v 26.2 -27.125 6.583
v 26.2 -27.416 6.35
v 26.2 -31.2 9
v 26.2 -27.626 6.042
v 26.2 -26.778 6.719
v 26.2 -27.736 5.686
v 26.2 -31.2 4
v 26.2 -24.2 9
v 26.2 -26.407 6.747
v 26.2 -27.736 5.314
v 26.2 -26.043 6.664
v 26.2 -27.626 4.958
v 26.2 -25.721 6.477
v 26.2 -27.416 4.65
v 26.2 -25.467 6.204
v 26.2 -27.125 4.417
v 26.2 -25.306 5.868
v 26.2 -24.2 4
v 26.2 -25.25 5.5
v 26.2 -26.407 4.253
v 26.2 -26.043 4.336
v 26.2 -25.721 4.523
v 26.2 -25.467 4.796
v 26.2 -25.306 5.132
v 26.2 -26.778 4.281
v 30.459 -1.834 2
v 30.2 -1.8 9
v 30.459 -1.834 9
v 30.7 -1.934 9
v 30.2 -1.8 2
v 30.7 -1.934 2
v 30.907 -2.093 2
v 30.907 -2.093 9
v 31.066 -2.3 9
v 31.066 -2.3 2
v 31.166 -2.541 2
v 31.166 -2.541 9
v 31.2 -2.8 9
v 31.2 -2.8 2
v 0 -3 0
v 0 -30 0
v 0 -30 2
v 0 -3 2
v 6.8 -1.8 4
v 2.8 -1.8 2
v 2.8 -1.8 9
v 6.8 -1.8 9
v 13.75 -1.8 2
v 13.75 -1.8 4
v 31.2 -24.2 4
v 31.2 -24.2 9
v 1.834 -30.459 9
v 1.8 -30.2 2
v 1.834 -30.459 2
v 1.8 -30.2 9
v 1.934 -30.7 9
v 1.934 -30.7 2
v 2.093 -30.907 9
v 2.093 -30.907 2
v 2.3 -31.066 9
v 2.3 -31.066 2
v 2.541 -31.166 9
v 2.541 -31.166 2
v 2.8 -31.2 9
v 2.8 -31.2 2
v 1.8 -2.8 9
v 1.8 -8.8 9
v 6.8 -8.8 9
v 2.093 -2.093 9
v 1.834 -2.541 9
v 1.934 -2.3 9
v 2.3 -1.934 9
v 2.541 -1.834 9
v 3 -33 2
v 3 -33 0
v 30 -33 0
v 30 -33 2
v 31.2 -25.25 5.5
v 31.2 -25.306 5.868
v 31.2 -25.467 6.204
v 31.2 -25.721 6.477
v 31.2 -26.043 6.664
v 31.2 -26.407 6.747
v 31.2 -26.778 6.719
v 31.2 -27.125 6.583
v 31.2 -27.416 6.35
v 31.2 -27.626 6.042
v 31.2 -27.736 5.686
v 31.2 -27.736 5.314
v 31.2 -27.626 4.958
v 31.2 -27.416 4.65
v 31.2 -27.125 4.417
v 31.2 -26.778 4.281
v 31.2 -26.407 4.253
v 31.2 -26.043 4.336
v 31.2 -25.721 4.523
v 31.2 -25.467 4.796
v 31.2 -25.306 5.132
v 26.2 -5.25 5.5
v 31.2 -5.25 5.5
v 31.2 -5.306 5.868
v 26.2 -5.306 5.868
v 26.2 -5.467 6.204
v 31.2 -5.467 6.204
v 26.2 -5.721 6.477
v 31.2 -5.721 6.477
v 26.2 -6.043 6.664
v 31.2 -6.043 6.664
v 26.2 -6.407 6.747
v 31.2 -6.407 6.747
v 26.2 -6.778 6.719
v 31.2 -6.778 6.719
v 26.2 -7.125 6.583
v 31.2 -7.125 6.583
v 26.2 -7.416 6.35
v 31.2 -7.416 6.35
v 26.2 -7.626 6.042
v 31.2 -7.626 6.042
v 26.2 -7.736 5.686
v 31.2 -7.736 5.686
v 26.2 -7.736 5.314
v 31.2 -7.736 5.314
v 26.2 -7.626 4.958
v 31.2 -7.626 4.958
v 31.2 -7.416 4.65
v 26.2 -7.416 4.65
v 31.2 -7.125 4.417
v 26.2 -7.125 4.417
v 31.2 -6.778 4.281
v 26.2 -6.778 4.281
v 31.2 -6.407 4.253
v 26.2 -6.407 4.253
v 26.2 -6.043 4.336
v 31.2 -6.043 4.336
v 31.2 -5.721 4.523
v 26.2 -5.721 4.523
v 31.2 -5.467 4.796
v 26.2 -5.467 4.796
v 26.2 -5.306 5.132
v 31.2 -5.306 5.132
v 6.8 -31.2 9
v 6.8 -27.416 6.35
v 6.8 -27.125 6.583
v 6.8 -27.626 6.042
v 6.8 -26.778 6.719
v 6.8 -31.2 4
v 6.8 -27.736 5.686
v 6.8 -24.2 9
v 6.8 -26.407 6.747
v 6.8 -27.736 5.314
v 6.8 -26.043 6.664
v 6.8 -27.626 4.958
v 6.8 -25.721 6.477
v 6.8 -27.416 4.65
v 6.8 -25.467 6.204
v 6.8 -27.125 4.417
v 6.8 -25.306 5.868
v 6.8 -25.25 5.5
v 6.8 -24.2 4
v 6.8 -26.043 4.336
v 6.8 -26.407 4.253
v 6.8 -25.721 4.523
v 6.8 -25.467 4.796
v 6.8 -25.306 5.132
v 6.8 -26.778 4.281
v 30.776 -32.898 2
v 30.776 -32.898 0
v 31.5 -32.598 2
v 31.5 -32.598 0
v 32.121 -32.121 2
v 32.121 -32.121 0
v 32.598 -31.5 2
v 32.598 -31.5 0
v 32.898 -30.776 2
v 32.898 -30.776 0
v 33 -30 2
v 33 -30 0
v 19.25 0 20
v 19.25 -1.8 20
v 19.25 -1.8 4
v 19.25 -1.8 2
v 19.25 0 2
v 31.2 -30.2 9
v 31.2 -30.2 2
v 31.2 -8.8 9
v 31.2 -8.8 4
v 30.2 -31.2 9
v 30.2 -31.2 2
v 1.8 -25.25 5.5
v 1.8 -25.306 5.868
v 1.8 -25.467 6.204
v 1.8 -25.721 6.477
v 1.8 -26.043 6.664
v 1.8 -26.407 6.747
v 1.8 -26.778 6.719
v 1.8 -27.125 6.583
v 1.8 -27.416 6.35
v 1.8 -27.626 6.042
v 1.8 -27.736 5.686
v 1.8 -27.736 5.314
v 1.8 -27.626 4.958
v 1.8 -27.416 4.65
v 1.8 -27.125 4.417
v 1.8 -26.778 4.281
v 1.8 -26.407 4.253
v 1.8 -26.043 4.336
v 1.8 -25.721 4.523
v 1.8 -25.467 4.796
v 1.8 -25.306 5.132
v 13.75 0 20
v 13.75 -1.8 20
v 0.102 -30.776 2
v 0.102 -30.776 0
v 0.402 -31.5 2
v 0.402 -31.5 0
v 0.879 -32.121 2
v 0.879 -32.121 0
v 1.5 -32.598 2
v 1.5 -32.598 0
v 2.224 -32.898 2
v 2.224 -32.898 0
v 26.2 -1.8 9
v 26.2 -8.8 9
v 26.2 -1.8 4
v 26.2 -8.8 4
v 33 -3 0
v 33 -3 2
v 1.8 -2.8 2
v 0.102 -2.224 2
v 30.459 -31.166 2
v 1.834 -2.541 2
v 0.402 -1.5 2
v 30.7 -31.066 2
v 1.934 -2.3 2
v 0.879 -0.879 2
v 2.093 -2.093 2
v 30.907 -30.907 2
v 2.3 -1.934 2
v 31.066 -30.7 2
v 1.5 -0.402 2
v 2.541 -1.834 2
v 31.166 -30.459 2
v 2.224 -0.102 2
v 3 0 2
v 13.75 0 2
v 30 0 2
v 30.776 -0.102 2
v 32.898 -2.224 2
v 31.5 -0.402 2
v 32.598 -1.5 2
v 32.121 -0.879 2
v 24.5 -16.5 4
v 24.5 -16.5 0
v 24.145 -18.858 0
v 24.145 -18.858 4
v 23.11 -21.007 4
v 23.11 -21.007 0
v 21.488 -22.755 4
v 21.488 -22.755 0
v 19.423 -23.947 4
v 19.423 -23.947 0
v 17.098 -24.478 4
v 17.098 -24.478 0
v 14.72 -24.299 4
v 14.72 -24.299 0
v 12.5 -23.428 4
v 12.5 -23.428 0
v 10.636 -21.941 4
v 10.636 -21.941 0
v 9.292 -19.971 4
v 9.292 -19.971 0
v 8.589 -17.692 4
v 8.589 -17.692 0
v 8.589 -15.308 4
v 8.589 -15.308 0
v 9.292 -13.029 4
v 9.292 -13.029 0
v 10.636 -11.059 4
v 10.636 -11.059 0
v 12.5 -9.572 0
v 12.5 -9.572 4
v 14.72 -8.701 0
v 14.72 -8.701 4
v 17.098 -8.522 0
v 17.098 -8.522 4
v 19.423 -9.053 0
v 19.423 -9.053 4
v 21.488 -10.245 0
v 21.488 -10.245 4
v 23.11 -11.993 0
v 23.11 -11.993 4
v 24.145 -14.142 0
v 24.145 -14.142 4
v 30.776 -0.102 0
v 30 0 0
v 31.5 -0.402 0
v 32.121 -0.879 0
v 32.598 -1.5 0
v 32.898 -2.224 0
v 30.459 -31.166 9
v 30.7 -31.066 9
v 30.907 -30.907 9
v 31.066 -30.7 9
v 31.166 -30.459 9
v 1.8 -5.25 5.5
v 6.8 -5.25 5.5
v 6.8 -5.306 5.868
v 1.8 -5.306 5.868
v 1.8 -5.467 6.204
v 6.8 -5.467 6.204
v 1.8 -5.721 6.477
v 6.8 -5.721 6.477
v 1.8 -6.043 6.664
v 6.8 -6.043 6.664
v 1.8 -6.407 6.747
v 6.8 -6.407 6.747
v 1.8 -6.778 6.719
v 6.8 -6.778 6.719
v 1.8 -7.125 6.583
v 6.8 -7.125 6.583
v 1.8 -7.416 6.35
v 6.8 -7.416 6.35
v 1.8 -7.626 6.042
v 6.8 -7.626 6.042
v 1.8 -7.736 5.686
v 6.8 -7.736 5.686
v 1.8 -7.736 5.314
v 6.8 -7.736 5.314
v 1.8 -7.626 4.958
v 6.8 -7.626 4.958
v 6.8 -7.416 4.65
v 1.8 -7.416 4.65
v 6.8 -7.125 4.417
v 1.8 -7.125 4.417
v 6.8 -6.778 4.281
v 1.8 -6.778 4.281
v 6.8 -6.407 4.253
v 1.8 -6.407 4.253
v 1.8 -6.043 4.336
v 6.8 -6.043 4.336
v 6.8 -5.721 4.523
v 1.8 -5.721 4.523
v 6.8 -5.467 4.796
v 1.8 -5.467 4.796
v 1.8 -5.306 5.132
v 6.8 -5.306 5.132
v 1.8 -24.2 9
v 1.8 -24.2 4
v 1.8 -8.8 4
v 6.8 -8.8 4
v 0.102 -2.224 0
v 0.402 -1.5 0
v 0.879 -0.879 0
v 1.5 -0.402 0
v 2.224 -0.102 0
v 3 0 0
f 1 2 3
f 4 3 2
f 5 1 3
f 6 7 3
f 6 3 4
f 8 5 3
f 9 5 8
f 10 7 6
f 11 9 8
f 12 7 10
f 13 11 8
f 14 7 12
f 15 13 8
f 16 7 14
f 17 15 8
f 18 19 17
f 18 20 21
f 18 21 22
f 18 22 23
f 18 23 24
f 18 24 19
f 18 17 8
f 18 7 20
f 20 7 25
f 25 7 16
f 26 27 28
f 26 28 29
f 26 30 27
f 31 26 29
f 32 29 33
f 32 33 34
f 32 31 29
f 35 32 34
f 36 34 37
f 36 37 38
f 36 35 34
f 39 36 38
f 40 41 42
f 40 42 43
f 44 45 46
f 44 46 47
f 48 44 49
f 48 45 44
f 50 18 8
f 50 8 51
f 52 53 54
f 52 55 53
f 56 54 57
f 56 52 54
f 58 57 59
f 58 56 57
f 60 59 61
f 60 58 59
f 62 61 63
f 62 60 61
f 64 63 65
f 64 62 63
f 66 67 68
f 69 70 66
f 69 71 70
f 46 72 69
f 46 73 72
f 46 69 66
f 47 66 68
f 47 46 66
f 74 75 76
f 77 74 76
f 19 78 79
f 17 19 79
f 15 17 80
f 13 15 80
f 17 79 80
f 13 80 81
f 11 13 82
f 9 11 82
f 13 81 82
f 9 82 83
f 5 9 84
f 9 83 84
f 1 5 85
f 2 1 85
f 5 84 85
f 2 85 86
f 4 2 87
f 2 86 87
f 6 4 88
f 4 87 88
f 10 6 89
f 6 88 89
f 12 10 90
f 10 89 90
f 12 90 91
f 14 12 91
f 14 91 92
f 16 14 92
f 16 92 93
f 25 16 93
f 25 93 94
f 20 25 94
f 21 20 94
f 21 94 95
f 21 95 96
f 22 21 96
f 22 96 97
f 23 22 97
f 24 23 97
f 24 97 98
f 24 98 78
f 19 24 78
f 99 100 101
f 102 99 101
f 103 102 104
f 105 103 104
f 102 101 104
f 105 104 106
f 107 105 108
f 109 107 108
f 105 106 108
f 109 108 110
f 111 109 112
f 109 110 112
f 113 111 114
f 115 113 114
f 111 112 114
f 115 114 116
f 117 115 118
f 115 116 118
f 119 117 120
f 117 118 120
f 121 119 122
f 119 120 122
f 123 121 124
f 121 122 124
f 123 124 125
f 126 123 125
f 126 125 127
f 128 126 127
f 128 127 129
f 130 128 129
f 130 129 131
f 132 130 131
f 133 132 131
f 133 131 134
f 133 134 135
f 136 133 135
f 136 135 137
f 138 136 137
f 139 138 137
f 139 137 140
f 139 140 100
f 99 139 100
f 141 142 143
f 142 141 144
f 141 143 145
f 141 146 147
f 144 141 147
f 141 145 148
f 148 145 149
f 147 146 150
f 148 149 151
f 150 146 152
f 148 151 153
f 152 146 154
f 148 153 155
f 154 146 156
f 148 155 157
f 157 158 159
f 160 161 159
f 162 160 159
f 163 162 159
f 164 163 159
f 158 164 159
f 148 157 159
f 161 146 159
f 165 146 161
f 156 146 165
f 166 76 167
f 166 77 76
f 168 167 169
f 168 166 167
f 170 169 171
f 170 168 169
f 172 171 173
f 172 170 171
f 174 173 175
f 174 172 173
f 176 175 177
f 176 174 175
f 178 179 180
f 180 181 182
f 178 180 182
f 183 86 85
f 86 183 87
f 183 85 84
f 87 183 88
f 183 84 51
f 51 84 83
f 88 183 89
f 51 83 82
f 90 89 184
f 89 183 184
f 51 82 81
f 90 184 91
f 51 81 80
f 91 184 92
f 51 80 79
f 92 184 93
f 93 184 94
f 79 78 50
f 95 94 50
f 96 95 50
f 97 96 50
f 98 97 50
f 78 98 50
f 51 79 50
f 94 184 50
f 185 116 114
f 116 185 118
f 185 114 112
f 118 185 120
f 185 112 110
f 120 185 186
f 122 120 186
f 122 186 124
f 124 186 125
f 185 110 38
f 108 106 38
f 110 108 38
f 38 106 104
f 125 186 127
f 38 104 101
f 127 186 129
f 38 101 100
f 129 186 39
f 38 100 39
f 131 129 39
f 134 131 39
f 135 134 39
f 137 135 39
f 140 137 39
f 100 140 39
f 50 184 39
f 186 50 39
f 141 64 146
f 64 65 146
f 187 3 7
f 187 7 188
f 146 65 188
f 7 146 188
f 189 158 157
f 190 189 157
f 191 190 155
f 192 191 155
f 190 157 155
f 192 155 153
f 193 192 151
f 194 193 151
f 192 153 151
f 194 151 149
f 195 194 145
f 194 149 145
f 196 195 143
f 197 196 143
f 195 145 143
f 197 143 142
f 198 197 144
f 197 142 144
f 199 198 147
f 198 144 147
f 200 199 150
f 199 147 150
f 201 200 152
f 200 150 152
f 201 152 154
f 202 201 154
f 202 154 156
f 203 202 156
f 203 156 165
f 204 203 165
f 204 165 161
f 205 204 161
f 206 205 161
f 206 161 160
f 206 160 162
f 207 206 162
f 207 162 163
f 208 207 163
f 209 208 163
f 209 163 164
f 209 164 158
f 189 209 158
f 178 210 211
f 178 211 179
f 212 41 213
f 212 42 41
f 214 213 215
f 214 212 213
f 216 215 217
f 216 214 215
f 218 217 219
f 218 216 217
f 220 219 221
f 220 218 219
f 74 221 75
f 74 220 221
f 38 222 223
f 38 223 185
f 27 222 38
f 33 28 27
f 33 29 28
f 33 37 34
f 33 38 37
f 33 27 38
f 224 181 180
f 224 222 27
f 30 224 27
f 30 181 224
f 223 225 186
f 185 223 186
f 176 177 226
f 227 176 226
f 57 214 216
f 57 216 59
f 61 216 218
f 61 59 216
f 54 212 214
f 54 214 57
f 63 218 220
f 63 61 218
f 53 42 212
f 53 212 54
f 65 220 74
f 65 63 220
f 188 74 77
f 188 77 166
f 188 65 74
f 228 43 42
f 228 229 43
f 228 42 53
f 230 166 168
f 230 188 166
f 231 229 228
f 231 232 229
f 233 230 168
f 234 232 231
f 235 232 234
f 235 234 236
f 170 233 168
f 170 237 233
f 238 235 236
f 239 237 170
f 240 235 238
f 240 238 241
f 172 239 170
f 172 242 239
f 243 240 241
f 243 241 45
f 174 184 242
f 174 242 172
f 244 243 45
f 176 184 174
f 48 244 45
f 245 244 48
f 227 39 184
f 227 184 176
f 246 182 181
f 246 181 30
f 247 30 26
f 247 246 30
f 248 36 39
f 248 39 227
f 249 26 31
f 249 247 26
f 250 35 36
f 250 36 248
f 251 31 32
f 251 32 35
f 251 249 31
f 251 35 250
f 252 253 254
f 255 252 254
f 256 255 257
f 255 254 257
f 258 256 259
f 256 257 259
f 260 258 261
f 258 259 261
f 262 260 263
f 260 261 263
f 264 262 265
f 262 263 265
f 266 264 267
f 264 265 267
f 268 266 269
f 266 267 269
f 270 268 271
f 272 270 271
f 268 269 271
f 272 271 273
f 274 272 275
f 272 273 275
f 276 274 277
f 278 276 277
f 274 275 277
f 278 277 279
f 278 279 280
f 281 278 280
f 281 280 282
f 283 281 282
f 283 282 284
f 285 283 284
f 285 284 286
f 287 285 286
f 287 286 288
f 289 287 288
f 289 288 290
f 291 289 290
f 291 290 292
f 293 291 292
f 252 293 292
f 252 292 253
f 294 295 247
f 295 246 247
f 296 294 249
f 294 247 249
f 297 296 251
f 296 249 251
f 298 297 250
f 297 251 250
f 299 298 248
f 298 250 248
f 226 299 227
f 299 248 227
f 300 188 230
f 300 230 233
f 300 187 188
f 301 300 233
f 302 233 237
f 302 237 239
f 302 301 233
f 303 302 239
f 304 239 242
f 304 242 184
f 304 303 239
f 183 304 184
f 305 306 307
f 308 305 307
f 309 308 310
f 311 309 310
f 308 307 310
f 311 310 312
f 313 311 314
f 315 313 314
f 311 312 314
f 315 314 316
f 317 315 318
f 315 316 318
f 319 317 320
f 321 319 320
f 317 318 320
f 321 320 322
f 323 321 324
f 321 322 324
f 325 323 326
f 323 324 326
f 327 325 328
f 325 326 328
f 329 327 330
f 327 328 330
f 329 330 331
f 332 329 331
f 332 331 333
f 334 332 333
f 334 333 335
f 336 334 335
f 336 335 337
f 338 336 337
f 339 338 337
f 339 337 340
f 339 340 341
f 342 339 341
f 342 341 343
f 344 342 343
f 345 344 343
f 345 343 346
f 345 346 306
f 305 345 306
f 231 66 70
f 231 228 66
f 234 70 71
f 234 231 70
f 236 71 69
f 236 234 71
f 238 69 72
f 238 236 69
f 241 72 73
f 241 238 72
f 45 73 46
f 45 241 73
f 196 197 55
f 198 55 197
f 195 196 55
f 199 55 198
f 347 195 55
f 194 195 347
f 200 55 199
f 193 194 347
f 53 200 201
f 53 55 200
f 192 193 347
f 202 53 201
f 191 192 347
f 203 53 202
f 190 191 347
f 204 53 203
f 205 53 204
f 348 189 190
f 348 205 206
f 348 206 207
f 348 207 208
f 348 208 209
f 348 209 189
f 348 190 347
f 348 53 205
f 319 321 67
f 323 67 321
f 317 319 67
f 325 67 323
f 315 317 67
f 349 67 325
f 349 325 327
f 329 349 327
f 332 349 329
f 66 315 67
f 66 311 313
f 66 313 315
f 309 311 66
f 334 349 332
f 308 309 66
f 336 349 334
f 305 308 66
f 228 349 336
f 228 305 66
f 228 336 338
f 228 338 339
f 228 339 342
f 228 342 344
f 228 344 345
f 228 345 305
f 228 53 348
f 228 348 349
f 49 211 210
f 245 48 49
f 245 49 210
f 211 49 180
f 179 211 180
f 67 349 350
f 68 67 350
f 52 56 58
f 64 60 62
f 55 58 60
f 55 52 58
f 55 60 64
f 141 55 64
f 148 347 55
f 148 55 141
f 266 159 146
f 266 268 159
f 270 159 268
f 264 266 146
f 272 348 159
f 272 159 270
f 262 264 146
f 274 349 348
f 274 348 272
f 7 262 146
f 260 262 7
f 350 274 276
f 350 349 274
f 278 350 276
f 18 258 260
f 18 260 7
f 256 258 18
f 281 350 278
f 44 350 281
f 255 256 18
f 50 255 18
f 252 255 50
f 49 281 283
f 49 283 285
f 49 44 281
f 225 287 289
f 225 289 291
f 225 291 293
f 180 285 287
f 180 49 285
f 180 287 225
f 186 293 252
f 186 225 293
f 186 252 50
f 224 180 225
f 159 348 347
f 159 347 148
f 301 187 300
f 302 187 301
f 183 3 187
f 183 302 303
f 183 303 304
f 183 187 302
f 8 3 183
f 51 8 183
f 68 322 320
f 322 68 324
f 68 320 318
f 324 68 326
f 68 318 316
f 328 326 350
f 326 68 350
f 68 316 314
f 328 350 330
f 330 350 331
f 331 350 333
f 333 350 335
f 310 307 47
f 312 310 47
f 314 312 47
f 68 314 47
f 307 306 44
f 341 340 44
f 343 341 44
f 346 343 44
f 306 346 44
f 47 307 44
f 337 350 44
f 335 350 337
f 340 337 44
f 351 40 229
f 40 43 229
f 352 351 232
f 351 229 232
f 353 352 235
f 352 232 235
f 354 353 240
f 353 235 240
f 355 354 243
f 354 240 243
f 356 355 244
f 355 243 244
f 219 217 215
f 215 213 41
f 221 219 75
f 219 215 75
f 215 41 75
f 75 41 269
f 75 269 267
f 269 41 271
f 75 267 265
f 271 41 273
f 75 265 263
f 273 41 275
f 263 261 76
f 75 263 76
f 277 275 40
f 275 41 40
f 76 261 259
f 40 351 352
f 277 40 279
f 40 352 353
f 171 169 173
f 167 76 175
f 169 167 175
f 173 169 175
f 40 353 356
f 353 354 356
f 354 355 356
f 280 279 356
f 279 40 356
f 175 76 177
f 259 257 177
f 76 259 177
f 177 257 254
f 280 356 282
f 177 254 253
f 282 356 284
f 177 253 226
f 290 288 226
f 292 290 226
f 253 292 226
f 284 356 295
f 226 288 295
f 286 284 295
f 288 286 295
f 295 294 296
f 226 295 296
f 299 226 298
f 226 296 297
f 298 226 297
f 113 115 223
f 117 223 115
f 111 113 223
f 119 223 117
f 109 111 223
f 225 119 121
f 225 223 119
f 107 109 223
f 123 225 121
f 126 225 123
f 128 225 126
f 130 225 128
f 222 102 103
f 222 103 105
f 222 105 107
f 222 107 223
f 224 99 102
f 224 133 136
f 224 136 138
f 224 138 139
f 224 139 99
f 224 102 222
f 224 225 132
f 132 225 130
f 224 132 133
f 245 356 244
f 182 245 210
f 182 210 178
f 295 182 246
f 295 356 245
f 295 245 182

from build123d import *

# Parameters (mm, degrees)
F0_W      = 33
F0_H      = 33
F1_DEPTH  = 2
F2_W      = 29.4
F2_H      = 29.4
F3_DEPTH  = 2
F4_W      = 5
F4_H      = 7
F5_DEPTH  = 5
F6_R      = 8
F7_DEPTH  = 25
F8_R      = 1.25
F9_DEPTH  = 35
F10_R     = 1
F11_R     = 3
F12_W     = 5.5
F12_H     = 1.8
F13_DEPTH = 18


with BuildPart() as f1:
    # F0 (on Top) → F1 (new body)
    with BuildSketch(Plane.XY):
        with Locations((16.5, -16.5)):
            Rectangle(F0_W, F0_H)
    extrude(amount=F1_DEPTH)

    # F2 (on face) → F3 (join)
    with BuildSketch(Plane.XY.offset(2)):
        with Locations((16.5, -16.5)):
            Rectangle(F2_W, F2_H)
    extrude(amount=F3_DEPTH)

    # F4 (on face) → F5 (join)
    with BuildSketch(Plane.XY.offset(4)):
        with Locations((4.3, -5.3)):
            Rectangle(F4_W, F4_H)
        with Locations((4.3, -27.7)):
            Rectangle(F4_W, F4_H)
        with Locations((28.7, -5.3)):
            Rectangle(F4_W, F4_H)
        with Locations((28.7, -27.7)):
            Rectangle(F4_W, F4_H)
    extrude(amount=F5_DEPTH)

    # F6 (on face) → F7 (cut)
    with BuildSketch(Plane(origin=(0, 0, 0), x_dir=(1, 0, 0), z_dir=(0, 0, -1))):
        with Locations((16.5, 16.5)):
            Circle(F6_R)
    extrude(amount=-F7_DEPTH, mode=Mode.SUBTRACT)

    # F8 (on face) → F9 (cut)
    with BuildSketch(Plane.YZ.offset(31.2)):
        with Locations((-26.5, 5.5)):
            Circle(F8_R)
        with Locations((-6.5, 5.5)):
            Circle(F8_R)
    extrude(amount=-F9_DEPTH, mode=Mode.SUBTRACT)

    # F10
    f10_edges = [f1.edges().sort_by_distance(p)[0] for p in [
        (31.2, -1.8, 5.5),
        (1.8, -1.8, 5.5),
        (1.8, -31.2, 5.5),
        (31.2, -31.2, 5.5),
    ]]
    fillet(f10_edges, radius=F10_R)

    # F11
    f11_edges = [f1.edges().sort_by_distance(p)[0] for p in [
        (0, -33, 1),
        (33, -33, 1),
        (0, 0, 1),
        (33, 0, 1),
    ]]
    fillet(f11_edges, radius=F11_R)

    # F12 (on face) → F13 (join)
    with BuildSketch(Plane.XY.offset(2)):
        with Locations((16.5, -0.9)):
            Rectangle(F12_W, F12_H)
    extrude(amount=F13_DEPTH)


solid = f1.part
